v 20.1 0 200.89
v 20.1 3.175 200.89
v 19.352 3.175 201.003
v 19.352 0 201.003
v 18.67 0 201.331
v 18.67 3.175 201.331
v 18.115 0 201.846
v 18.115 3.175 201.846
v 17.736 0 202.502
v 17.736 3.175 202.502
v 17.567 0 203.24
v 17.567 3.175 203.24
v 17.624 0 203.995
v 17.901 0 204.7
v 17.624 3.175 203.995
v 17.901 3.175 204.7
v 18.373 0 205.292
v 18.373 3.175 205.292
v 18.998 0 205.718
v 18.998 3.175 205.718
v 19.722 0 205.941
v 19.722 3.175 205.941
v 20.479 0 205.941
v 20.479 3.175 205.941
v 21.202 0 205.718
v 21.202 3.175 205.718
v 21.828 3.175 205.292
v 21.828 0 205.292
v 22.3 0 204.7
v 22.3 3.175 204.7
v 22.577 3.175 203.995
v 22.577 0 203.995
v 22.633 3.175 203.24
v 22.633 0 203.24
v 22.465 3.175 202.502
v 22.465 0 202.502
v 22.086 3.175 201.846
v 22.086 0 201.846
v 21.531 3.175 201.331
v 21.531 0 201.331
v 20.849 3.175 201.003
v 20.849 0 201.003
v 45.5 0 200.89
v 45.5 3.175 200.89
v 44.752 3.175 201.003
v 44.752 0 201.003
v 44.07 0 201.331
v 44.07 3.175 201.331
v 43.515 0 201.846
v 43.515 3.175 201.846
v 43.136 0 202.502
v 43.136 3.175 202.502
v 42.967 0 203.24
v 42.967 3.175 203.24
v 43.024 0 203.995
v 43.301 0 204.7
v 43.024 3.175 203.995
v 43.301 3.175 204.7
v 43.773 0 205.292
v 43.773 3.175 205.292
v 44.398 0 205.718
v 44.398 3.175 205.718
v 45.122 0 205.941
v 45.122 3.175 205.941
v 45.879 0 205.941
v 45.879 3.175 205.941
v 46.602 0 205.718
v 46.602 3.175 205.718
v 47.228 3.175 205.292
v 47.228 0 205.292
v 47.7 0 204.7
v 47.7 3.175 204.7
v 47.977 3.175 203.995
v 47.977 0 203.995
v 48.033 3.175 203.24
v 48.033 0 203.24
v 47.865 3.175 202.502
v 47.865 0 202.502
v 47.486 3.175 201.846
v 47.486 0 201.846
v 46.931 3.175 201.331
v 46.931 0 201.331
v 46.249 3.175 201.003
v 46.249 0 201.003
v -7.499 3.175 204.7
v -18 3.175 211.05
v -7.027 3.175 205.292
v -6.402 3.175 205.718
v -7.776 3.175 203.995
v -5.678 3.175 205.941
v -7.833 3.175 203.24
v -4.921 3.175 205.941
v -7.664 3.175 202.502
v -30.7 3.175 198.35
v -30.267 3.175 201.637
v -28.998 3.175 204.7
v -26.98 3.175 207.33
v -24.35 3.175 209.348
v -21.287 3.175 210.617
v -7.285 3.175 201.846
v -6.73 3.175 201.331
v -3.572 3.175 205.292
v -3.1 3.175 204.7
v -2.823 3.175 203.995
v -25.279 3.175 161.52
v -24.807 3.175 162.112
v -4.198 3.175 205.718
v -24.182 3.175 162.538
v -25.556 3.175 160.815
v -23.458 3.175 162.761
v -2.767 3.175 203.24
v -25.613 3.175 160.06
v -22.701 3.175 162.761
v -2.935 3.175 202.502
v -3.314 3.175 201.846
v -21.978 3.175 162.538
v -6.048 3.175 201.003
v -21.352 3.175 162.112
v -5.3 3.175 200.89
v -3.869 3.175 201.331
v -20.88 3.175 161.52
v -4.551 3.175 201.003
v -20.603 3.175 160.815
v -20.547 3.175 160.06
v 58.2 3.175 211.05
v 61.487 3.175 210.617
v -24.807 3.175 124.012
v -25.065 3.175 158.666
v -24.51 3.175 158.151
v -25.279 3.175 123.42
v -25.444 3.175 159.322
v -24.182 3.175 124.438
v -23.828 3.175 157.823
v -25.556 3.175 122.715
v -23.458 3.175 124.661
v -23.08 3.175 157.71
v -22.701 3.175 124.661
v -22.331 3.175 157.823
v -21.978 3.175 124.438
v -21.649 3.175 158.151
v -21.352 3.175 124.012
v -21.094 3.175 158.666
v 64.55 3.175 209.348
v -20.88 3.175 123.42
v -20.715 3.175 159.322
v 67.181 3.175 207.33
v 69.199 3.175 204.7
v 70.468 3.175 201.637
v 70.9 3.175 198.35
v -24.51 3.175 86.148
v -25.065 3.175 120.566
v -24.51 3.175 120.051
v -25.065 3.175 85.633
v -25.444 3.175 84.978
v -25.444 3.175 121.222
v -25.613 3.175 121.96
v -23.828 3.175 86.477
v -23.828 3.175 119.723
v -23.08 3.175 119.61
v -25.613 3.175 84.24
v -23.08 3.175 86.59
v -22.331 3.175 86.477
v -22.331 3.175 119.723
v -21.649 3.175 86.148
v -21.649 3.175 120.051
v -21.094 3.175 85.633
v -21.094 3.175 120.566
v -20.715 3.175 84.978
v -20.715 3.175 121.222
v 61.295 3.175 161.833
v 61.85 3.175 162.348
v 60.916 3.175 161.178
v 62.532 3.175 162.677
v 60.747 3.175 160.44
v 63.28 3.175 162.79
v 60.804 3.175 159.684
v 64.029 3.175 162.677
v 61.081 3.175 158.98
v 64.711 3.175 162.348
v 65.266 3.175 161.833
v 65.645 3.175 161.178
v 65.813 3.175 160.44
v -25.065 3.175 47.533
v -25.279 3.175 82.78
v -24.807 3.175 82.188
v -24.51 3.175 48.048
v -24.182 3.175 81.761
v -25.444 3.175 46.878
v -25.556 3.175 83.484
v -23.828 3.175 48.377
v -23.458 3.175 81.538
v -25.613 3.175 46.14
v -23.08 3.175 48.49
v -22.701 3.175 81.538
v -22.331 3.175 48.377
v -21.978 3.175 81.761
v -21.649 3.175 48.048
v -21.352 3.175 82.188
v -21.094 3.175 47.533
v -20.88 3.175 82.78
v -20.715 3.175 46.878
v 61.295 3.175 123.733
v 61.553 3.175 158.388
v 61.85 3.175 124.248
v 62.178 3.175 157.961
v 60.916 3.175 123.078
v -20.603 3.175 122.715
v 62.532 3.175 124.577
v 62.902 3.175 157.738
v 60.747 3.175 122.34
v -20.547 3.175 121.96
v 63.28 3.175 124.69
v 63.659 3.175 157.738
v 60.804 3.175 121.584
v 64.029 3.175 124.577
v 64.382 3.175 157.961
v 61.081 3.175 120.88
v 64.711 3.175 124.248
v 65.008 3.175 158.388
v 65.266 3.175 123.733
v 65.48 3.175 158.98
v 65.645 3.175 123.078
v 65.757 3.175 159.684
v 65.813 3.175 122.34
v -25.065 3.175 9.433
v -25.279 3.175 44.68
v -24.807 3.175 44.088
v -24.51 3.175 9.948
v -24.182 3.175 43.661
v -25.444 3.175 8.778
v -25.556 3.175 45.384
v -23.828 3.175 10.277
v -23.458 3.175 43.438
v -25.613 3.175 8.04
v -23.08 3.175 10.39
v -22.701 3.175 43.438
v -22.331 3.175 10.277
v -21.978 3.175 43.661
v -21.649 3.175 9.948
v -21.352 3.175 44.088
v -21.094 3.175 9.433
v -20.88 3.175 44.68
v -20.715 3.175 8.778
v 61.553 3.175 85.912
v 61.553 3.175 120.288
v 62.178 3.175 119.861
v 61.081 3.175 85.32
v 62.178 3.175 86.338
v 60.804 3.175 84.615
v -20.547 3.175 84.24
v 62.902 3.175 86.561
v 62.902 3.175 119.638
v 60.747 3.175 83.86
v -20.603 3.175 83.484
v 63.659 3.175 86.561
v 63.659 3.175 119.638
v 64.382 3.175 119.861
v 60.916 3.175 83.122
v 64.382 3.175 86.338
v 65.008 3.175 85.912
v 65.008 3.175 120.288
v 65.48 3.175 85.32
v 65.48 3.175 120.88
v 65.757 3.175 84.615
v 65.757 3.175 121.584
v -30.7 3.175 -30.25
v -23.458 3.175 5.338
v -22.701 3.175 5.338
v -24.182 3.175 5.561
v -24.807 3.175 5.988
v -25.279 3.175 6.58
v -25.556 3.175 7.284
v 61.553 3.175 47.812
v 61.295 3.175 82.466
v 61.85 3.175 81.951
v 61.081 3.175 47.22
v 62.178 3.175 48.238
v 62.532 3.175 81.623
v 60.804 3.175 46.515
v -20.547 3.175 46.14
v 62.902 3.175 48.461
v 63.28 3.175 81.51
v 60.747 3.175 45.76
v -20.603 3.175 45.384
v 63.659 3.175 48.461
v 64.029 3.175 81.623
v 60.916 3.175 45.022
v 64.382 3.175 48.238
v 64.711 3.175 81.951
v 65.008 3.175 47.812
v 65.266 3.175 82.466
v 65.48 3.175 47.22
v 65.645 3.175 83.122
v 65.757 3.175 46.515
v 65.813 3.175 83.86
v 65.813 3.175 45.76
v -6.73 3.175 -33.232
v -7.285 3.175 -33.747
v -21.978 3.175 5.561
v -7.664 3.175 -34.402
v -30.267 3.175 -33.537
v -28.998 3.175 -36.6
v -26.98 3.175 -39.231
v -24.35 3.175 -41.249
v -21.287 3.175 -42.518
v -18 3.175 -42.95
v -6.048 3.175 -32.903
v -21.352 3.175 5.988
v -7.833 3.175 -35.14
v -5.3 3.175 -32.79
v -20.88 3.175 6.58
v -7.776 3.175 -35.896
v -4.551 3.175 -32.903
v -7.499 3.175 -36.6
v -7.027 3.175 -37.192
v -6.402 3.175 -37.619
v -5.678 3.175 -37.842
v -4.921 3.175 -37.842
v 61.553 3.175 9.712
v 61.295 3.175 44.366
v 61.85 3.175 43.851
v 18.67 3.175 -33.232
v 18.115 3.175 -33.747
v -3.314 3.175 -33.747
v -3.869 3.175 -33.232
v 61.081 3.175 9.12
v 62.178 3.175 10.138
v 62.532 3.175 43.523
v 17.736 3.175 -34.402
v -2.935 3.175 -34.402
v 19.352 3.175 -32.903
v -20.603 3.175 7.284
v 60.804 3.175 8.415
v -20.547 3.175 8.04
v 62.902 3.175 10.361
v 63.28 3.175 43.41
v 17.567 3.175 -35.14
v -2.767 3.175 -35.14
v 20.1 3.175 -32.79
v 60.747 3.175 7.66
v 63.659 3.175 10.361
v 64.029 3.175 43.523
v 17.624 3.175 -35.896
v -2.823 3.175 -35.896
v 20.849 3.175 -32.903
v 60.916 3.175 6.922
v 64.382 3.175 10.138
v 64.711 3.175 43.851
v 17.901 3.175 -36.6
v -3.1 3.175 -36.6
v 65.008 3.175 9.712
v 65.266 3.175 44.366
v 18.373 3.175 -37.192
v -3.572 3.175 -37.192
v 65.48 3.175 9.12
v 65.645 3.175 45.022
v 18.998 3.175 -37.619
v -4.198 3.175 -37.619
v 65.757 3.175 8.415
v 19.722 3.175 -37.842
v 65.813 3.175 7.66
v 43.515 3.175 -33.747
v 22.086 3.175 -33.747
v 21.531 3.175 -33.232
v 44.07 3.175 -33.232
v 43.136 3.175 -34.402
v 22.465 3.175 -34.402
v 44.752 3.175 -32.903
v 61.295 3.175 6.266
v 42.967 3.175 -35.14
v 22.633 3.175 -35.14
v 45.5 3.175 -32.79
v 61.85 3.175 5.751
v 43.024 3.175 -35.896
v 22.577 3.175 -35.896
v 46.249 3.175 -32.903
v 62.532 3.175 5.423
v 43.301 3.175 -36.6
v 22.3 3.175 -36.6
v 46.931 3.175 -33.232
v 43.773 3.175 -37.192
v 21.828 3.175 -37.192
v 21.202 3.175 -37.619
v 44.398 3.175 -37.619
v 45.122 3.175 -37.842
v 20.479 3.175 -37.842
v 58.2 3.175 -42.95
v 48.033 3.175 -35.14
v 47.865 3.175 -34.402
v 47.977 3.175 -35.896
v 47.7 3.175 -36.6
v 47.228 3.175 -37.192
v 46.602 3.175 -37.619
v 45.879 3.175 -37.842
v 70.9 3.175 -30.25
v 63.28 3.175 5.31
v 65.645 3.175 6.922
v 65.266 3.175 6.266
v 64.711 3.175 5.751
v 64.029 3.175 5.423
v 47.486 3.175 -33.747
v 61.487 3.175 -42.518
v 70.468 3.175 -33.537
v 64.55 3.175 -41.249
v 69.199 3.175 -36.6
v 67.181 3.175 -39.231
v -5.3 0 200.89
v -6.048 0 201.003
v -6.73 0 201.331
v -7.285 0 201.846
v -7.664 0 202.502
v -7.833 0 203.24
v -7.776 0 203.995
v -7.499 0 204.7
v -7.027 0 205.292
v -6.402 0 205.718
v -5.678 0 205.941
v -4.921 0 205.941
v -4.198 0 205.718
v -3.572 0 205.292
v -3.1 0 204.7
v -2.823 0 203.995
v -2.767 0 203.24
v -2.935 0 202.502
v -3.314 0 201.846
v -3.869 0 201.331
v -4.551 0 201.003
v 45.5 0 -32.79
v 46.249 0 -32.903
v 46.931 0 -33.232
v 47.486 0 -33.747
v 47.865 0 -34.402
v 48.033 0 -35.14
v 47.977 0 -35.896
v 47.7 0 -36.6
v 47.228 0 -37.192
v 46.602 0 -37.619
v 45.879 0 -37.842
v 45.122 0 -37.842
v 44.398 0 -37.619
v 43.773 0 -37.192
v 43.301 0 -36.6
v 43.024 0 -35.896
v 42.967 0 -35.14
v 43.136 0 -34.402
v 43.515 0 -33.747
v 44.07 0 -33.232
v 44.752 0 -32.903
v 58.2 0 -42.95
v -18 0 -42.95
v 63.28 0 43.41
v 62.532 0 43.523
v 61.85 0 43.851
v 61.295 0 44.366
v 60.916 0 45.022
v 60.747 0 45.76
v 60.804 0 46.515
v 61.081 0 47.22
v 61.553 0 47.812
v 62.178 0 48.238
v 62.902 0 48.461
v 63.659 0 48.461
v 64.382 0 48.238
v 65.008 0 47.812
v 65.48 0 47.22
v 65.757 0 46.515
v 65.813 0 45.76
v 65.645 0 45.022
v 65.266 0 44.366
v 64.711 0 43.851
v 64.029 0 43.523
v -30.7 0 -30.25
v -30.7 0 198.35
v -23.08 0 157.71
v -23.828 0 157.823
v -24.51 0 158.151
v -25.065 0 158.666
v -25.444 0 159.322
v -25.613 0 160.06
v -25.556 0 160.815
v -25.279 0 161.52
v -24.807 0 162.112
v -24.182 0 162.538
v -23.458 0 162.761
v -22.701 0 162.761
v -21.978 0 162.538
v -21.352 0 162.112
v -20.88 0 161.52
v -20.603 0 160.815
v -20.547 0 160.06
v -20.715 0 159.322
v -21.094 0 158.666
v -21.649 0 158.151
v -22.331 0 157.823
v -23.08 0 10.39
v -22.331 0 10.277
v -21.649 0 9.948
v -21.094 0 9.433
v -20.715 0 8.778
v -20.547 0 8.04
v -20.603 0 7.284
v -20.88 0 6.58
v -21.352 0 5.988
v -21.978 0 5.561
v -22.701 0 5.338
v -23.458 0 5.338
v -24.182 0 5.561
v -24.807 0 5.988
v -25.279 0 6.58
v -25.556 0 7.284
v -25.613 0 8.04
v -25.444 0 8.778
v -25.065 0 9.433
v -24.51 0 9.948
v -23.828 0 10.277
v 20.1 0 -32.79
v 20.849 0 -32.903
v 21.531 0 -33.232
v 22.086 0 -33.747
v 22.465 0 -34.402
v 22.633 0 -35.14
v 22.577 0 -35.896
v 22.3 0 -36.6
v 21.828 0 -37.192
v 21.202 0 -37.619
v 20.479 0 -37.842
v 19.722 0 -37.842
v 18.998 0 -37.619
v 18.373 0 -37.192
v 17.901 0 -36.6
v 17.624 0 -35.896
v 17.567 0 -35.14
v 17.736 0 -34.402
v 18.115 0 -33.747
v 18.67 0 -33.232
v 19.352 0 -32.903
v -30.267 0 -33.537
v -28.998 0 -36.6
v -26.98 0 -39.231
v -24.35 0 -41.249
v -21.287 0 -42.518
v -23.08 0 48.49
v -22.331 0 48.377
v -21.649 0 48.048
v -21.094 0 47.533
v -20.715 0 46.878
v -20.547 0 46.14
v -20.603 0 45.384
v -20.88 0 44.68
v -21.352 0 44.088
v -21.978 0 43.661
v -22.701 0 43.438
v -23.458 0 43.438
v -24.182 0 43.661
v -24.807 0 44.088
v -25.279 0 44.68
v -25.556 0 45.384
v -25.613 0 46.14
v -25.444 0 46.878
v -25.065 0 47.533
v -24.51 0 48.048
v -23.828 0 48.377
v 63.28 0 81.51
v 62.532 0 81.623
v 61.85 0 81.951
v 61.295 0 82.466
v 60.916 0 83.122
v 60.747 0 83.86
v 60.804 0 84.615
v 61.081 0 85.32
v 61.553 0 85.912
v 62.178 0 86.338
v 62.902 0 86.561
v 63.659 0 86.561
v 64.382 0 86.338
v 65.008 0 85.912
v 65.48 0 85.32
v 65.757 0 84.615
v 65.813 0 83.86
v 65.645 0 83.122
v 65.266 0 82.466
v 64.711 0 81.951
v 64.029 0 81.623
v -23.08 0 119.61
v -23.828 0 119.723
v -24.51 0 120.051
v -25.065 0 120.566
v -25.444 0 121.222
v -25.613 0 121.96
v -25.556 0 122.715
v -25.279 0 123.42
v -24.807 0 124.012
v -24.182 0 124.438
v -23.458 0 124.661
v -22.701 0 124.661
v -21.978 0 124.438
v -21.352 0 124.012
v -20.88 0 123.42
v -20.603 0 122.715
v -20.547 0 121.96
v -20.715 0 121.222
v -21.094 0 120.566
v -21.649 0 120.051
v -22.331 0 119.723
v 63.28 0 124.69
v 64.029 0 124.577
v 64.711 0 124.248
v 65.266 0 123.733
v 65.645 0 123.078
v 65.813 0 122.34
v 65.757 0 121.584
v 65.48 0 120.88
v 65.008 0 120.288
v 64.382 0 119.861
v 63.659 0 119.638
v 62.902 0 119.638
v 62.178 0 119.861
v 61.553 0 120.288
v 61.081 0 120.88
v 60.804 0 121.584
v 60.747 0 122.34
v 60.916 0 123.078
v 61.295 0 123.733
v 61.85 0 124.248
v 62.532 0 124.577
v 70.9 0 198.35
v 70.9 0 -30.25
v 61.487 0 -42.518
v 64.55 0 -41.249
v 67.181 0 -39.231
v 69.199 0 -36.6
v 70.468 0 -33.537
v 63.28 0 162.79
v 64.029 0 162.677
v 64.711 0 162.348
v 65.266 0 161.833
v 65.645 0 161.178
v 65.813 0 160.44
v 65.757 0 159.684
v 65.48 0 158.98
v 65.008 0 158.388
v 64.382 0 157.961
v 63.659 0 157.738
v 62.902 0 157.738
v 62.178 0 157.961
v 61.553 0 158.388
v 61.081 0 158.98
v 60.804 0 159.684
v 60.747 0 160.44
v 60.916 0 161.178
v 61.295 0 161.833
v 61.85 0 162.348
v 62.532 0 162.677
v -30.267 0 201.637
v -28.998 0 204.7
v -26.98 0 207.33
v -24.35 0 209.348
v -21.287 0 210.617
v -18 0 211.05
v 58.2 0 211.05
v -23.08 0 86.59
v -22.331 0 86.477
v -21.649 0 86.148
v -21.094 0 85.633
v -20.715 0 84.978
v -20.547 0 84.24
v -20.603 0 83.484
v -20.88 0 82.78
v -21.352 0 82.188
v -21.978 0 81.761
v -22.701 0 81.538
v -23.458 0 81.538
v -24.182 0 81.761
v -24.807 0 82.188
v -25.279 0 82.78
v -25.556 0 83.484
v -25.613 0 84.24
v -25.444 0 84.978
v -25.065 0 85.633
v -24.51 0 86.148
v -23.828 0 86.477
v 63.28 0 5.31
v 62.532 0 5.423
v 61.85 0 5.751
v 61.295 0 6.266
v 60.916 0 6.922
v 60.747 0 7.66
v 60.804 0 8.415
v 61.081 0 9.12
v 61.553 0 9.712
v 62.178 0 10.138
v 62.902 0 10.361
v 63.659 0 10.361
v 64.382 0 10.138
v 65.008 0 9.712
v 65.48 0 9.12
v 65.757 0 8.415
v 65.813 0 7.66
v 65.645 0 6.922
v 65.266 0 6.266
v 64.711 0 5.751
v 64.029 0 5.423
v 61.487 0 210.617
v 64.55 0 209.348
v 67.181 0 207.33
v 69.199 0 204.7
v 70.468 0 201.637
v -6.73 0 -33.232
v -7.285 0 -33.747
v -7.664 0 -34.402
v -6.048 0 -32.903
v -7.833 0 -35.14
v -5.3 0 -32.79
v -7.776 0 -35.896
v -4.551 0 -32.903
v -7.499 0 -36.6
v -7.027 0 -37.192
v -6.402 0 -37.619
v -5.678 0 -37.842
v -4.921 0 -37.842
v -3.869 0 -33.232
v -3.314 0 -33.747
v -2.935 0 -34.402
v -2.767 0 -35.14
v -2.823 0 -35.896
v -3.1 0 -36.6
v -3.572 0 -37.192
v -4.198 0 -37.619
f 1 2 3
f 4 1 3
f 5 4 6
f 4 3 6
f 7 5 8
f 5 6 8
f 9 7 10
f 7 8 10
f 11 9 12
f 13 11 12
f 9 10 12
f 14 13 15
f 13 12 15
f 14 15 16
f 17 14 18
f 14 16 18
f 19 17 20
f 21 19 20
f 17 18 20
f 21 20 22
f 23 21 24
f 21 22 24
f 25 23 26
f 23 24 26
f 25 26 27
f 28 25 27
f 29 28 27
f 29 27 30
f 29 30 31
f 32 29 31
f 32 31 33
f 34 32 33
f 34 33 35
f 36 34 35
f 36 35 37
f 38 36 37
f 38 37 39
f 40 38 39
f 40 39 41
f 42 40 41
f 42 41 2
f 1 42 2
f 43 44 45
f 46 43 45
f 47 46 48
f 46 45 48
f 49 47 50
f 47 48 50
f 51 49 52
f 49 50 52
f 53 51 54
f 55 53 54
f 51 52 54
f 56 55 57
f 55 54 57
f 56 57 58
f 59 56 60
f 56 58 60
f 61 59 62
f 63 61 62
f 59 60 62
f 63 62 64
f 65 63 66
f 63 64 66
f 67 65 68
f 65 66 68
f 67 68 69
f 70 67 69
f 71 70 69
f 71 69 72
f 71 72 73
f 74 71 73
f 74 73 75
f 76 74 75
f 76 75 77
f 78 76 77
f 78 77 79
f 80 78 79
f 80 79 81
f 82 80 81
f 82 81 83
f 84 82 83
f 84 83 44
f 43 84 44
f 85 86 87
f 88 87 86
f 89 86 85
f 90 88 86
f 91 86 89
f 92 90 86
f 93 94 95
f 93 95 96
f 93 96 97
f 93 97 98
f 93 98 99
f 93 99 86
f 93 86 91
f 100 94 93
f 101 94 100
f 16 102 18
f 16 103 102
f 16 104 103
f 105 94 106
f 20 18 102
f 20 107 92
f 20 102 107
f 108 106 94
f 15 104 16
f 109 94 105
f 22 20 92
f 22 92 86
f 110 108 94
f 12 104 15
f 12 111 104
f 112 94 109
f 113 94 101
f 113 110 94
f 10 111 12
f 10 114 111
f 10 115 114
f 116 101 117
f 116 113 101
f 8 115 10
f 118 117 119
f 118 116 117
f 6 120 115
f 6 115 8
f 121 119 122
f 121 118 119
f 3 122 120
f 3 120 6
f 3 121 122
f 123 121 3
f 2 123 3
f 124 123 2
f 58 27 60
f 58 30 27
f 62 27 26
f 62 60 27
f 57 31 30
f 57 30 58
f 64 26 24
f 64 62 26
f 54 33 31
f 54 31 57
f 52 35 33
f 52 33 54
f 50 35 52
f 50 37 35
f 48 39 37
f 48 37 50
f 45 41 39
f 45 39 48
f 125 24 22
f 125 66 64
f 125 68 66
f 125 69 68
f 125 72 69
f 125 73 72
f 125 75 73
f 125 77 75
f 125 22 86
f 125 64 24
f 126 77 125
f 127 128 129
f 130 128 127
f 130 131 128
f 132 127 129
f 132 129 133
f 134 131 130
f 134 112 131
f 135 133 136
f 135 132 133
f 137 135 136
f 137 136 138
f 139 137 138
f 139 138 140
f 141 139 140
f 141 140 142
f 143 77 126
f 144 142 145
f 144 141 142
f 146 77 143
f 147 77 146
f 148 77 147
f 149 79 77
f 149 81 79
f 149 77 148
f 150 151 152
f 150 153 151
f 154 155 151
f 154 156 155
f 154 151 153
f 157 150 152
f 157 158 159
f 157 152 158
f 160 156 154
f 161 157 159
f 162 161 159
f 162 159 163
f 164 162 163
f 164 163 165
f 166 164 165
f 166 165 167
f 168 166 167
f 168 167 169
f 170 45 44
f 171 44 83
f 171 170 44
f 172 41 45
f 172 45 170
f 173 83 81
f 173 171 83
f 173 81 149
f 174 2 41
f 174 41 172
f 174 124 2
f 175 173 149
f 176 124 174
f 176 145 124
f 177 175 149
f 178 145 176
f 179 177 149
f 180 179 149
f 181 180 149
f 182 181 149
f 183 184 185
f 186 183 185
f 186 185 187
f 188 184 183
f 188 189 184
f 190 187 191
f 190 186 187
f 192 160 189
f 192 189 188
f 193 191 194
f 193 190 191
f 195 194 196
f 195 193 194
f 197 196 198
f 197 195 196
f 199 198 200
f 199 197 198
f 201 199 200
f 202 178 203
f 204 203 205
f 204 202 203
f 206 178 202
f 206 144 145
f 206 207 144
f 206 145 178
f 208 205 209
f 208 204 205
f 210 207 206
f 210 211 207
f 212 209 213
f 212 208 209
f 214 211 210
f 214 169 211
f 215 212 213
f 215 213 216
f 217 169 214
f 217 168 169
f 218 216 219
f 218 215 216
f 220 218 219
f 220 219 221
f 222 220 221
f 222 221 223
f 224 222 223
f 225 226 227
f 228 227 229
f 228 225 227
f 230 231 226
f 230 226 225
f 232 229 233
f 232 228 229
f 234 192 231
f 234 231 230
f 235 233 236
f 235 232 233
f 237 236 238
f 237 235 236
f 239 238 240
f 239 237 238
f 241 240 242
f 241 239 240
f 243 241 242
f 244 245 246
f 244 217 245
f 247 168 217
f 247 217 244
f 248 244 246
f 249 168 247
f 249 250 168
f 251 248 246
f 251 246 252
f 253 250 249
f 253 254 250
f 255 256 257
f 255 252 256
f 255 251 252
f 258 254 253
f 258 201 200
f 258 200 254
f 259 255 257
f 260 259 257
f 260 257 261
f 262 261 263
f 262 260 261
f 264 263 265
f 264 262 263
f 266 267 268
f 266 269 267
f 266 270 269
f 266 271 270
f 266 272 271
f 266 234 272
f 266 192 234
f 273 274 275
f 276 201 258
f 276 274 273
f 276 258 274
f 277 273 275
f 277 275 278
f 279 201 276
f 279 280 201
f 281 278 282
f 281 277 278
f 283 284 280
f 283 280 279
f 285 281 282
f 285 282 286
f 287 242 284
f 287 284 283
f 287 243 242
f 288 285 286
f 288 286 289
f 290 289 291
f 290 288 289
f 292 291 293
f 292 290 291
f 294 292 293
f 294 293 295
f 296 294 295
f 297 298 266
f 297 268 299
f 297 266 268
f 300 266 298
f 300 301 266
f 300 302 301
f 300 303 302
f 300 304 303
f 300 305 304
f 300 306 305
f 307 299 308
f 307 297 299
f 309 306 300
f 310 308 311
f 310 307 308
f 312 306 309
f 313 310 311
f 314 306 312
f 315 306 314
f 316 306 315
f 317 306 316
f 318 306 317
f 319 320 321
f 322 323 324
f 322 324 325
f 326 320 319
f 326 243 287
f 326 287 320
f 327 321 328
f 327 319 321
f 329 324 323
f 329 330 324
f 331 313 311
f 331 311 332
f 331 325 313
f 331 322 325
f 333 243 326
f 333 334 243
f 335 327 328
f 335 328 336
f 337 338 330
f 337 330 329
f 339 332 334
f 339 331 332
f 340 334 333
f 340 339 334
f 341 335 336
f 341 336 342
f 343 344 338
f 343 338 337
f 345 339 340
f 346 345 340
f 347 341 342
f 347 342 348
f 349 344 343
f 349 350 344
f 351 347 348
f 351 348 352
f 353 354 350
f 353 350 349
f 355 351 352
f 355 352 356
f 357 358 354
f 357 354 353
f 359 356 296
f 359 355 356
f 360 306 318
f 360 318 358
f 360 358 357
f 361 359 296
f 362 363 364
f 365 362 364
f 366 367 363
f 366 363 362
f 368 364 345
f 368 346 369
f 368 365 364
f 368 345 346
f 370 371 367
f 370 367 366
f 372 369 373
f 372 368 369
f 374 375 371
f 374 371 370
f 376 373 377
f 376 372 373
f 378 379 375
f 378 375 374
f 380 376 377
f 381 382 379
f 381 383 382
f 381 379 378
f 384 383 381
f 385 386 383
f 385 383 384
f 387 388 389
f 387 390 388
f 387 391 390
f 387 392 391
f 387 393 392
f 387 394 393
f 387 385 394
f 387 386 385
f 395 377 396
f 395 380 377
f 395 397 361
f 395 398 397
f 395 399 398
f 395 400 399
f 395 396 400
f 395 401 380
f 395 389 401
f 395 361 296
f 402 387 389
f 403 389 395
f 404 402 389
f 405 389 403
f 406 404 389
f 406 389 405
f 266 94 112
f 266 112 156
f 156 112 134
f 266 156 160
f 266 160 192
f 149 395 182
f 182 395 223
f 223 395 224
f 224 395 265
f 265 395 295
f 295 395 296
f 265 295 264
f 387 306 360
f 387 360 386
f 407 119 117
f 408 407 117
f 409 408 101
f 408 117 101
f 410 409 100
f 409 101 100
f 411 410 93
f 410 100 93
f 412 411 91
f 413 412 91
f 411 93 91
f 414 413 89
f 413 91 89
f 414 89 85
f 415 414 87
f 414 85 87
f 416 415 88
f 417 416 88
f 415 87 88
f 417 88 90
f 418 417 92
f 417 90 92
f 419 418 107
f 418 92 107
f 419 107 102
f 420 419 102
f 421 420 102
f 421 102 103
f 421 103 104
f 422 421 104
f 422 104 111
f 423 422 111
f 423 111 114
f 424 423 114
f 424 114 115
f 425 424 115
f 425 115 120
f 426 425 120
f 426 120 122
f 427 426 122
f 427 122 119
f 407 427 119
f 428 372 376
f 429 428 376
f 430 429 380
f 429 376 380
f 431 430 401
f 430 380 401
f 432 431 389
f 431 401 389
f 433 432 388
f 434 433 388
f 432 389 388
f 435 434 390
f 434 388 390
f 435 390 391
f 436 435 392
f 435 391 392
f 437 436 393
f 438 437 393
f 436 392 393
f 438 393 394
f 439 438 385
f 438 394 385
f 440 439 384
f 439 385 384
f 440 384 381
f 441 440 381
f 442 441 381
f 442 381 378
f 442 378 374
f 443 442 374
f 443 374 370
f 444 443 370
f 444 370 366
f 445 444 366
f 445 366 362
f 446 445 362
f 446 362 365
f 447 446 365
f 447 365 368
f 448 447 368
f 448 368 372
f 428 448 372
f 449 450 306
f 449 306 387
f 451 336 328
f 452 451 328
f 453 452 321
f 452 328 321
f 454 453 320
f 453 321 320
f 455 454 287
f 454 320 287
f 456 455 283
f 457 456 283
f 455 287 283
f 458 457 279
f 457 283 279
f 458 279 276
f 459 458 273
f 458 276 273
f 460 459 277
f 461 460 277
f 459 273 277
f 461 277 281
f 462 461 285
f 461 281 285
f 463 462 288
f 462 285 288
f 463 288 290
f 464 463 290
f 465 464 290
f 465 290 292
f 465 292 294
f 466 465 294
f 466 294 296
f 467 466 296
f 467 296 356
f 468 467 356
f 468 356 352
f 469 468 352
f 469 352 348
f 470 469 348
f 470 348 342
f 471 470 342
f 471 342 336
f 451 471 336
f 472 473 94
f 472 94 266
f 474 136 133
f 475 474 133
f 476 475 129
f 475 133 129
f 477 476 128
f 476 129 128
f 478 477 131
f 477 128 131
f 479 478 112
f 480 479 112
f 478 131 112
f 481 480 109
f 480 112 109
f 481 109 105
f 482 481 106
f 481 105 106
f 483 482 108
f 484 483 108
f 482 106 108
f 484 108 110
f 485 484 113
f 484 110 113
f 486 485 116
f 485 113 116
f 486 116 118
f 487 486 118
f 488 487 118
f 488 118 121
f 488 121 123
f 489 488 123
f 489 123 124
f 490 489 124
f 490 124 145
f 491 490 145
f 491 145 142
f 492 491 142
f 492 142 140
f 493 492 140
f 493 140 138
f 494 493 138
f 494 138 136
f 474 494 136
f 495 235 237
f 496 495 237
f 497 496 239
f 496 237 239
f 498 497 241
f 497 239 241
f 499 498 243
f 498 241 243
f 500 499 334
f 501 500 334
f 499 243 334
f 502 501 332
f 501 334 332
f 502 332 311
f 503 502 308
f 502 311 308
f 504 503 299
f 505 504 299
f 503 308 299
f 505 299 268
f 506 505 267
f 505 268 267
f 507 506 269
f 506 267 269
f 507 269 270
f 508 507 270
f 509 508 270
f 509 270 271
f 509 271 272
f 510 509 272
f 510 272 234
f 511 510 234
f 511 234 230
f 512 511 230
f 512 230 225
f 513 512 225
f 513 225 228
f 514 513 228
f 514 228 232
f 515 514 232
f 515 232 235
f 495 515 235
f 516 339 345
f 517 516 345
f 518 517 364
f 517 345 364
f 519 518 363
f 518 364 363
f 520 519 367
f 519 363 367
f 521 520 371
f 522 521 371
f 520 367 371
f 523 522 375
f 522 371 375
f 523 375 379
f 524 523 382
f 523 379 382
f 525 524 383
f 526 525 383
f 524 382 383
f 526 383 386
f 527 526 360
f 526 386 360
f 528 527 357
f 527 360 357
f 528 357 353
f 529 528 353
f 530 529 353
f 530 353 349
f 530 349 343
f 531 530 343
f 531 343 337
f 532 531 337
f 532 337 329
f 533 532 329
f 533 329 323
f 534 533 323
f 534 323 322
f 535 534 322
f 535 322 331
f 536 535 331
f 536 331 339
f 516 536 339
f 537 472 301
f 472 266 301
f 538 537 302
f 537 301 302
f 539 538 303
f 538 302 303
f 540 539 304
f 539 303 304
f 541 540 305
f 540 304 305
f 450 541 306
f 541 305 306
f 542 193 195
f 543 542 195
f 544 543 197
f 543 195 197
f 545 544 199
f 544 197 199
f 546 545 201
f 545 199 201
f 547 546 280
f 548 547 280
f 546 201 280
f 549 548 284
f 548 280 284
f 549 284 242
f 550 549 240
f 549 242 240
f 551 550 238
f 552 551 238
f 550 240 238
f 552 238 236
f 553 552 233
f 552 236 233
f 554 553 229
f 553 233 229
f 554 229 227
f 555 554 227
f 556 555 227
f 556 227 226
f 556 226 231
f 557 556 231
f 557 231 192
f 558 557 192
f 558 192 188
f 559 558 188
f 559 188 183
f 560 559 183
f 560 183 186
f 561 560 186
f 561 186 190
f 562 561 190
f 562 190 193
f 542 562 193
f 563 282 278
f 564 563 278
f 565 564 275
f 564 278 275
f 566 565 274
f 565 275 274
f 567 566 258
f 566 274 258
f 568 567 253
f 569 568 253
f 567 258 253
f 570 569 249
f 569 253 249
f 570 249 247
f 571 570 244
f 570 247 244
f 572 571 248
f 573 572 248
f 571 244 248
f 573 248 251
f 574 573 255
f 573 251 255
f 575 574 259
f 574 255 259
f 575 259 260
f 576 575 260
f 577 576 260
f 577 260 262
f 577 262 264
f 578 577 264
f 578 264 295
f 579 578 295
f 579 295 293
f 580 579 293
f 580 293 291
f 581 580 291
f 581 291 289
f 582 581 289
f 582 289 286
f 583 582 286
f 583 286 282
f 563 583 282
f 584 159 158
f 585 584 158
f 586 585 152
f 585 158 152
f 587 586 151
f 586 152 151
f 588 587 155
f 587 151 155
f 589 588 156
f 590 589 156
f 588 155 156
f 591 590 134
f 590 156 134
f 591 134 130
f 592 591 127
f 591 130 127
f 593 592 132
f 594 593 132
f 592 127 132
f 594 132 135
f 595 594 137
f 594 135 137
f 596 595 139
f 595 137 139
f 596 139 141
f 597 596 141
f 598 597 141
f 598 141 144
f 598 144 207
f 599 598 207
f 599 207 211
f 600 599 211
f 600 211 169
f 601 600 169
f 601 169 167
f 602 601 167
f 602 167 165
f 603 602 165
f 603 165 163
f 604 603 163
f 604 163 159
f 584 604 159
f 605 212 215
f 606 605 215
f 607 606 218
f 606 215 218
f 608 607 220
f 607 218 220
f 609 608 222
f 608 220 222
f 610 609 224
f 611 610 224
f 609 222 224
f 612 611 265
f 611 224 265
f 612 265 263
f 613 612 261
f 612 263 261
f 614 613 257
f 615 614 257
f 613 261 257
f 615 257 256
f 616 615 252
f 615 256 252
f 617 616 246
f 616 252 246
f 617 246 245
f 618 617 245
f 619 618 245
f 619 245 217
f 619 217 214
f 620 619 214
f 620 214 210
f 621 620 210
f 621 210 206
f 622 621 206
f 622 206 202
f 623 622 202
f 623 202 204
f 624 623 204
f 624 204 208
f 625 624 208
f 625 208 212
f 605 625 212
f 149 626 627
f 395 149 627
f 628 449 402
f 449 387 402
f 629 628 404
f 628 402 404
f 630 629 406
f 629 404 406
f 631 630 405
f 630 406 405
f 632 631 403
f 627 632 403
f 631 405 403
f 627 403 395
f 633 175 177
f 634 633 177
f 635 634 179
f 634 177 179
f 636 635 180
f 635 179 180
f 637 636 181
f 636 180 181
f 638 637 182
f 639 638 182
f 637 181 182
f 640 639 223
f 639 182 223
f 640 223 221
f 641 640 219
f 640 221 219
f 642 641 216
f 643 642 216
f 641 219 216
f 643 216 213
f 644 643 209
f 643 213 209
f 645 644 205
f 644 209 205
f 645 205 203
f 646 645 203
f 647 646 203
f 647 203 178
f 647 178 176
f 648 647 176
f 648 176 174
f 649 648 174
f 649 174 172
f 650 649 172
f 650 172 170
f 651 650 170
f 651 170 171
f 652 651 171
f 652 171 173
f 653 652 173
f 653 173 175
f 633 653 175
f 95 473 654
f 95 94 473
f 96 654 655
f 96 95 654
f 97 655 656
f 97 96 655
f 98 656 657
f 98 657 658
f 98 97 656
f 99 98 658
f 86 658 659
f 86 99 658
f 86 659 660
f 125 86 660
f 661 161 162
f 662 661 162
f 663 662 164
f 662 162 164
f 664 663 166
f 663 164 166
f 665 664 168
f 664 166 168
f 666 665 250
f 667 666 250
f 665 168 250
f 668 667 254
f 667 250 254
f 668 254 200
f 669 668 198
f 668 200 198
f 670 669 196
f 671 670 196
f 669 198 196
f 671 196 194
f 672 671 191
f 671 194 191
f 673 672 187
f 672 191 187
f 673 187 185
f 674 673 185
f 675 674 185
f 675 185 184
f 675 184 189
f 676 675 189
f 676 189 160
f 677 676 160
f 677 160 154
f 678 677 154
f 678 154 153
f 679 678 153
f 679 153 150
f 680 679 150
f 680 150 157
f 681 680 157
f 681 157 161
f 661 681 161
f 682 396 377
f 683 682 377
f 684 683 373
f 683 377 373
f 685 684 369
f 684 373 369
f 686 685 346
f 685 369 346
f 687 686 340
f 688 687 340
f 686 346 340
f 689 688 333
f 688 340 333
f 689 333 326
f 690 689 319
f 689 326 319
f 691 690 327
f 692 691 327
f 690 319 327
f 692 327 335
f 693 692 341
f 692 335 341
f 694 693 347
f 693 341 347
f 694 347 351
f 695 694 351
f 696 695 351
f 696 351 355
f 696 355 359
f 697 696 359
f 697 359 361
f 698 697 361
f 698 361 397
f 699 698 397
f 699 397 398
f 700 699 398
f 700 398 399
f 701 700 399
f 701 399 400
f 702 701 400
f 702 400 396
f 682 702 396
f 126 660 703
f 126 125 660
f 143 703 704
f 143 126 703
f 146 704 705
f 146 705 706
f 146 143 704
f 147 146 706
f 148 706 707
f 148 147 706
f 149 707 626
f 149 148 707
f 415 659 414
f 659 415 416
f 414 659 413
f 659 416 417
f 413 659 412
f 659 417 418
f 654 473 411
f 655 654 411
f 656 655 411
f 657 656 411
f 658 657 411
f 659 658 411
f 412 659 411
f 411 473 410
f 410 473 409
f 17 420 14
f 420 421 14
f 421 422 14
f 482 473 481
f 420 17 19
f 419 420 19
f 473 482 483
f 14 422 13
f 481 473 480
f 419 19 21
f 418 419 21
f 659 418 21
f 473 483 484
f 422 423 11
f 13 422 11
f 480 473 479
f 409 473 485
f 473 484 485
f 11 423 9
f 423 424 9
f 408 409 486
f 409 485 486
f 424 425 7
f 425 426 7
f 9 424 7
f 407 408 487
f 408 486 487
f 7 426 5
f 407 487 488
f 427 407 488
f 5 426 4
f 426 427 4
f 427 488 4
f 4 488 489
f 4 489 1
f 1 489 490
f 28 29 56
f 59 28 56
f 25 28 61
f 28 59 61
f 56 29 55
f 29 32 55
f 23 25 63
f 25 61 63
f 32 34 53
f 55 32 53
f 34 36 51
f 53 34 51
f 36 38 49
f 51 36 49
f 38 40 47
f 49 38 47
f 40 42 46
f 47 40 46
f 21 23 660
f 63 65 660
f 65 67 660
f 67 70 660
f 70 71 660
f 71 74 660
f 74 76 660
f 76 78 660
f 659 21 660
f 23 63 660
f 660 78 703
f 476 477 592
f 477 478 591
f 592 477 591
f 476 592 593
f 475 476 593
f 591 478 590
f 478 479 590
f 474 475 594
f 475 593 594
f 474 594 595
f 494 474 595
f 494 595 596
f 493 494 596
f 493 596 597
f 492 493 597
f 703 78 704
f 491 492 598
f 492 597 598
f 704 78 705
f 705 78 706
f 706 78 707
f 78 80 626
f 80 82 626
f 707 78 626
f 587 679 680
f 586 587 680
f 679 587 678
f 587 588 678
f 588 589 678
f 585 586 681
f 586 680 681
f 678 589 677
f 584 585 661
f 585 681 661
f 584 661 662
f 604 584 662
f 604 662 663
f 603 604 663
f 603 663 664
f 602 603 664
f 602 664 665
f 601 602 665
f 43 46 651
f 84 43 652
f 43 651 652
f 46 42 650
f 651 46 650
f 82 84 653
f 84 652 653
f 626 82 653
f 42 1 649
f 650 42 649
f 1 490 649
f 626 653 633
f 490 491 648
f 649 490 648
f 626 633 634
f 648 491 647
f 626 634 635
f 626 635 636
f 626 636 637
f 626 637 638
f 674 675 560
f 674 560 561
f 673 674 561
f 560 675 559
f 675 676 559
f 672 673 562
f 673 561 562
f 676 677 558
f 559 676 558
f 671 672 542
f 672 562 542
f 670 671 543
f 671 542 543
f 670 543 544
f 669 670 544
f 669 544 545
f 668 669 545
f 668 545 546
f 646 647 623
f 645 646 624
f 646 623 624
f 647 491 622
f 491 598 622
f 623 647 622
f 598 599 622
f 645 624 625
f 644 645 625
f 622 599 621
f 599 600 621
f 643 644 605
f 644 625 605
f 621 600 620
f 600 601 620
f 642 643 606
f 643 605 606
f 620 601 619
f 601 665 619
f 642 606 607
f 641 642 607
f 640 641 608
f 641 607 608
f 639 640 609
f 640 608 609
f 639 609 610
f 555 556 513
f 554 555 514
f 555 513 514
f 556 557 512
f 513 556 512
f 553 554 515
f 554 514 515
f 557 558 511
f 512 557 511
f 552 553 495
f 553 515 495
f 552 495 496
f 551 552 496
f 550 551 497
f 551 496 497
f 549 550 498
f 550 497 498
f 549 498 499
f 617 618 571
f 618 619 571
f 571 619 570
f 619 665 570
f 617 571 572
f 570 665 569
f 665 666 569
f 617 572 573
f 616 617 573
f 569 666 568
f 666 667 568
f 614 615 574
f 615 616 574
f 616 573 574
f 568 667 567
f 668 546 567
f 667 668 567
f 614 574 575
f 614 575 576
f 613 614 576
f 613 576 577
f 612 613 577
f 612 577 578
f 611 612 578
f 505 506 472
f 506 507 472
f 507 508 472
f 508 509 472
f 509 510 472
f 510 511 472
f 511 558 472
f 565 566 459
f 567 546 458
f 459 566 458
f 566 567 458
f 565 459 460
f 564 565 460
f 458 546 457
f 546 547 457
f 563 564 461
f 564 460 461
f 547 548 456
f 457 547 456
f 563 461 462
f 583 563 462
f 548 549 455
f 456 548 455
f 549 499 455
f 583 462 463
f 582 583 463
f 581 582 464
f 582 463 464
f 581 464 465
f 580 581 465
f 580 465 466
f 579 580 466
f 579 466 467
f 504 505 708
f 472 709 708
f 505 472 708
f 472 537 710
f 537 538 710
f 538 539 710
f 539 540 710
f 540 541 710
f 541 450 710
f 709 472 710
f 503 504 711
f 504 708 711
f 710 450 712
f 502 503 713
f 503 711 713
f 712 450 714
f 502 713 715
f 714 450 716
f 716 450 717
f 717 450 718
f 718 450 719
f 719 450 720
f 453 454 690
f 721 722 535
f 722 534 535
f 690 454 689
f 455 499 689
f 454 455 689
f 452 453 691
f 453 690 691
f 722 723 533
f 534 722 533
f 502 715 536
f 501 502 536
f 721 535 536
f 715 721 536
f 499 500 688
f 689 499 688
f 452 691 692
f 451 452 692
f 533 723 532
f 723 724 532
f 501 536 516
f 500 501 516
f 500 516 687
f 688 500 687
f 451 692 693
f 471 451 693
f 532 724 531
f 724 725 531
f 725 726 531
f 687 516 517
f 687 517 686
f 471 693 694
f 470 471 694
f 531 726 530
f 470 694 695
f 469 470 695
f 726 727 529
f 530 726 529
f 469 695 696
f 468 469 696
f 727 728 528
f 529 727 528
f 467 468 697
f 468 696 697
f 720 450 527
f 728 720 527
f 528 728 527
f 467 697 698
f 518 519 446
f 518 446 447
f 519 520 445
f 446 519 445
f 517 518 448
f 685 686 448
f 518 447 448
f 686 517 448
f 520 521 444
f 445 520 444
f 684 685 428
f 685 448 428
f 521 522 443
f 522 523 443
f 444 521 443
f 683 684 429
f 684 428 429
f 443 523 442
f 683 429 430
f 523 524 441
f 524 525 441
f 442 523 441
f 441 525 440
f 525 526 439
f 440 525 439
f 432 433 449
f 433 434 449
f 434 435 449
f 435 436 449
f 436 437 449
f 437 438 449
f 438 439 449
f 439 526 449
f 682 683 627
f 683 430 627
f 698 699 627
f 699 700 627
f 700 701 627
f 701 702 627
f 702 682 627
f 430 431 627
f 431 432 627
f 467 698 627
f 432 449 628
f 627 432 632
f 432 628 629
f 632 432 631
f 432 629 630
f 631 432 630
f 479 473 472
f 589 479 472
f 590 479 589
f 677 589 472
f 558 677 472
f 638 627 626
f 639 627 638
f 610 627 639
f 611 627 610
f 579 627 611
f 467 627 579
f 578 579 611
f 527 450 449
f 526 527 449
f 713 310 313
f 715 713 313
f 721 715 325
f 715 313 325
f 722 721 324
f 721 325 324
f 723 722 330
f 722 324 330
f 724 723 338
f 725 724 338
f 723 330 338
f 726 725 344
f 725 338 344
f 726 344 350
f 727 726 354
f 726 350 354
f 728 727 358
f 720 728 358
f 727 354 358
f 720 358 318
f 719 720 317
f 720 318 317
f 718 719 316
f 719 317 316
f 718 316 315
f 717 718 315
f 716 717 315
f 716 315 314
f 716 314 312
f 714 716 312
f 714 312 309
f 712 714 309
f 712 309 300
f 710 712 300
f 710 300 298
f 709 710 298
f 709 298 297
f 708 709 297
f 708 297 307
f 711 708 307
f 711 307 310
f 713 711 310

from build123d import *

# Parameters (mm, degrees)
SKETCH1_W           = 101.6
SKETCH1_H           = 254
BOSS_EXTRUDE1_DEPTH = 3.175
SKETCH2_R           = 2.54
CUT_EXTRUDE1_DEPTH  = 223.663234681
FILLET1_R           = 12.7


with BuildPart() as part:
    # Sketch1 → Boss-Extrude1 (new body)
    with BuildSketch(Plane(origin=(0, 0, 0), x_dir=(1, 0, 0), z_dir=(0, 1, 0))):
        with Locations((20.100372359, -84.049692378)):
            Rectangle(SKETCH1_W, SKETCH1_H)
    extrude(amount=BOSS_EXTRUDE1_DEPTH)

    # Sketch2 → Cut-Extrude1 (cut, through all)
    with BuildSketch(Plane(origin=(0, 3.175, 0), x_dir=(1, 0, 0), z_dir=(0, 1, 0))):
        with Locations(Location((-5.299627641, 35.330307622, 0), (0, 0, 270))):
            Circle(SKETCH2_R)
        with Locations(Location((20.100372359, 35.330307622, 0), (0, 0, 270))):
            Circle(SKETCH2_R)
        with Locations(Location((45.500372359, 35.330307622, 0), (0, 0, 270))):
            Circle(SKETCH2_R)
        with Locations(Location((-23.079627641, -84.049692378, 0), (0, 0, 270))):
            Circle(SKETCH2_R)
        with Locations(Location((-23.079627641, -45.949692378, 0), (0, 0, 270))):
            Circle(SKETCH2_R)
        with Locations(Location((-23.079627641, -7.849692378, 0), (0, 0, 270))):
            Circle(SKETCH2_R)
        with Locations(Location((63.280372359, -7.849692378, 0), (0, 0, 90))):
            Circle(SKETCH2_R)
        with Locations(Location((63.280372359, -45.949692378, 0), (0, 0, 90))):
            Circle(SKETCH2_R)
        with Locations(Location((63.280372359, -84.049692378, 0), (0, 0, 90))):
            Circle(SKETCH2_R)
        with Locations(Location((63.280372359, -122.149692378, 0), (0, 0, 270))):
            Circle(SKETCH2_R)
        with Locations(Location((63.280372359, -160.249692378, 0), (0, 0, 270))):
            Circle(SKETCH2_R)
        with Locations(Location((-23.079627641, -160.249692378, 0), (0, 0, 90))):
            Circle(SKETCH2_R)
        with Locations(Location((-23.079627641, -122.149692378, 0), (0, 0, 90))):
            Circle(SKETCH2_R)
        with Locations(Location((45.500372359, -203.429692378, 0), (0, 0, 90))):
            Circle(SKETCH2_R)
        with Locations(Location((20.100372359, -203.429692378, 0), (0, 0, 90))):
            Circle(SKETCH2_R)
        with Locations(Location((-5.299627641, -203.429692378, 0), (0, 0, 90))):
            Circle(SKETCH2_R)
    extrude(amount=-CUT_EXTRUDE1_DEPTH, mode=Mode.SUBTRACT)

    # Fillet1
    fillet1_edges = [part.edges().sort_by_distance(p)[0] for p in [
        (-30.699627641, 1.5875, -42.950307622),
        (70.900372359, 1.5875, -42.950307622),
        (70.900372359, 1.5875, 211.049692378),
        (-30.699627641, 1.5875, 211.049692378),
    ]]
    fillet(fillet1_edges, radius=FILLET1_R)


solid = part.part
